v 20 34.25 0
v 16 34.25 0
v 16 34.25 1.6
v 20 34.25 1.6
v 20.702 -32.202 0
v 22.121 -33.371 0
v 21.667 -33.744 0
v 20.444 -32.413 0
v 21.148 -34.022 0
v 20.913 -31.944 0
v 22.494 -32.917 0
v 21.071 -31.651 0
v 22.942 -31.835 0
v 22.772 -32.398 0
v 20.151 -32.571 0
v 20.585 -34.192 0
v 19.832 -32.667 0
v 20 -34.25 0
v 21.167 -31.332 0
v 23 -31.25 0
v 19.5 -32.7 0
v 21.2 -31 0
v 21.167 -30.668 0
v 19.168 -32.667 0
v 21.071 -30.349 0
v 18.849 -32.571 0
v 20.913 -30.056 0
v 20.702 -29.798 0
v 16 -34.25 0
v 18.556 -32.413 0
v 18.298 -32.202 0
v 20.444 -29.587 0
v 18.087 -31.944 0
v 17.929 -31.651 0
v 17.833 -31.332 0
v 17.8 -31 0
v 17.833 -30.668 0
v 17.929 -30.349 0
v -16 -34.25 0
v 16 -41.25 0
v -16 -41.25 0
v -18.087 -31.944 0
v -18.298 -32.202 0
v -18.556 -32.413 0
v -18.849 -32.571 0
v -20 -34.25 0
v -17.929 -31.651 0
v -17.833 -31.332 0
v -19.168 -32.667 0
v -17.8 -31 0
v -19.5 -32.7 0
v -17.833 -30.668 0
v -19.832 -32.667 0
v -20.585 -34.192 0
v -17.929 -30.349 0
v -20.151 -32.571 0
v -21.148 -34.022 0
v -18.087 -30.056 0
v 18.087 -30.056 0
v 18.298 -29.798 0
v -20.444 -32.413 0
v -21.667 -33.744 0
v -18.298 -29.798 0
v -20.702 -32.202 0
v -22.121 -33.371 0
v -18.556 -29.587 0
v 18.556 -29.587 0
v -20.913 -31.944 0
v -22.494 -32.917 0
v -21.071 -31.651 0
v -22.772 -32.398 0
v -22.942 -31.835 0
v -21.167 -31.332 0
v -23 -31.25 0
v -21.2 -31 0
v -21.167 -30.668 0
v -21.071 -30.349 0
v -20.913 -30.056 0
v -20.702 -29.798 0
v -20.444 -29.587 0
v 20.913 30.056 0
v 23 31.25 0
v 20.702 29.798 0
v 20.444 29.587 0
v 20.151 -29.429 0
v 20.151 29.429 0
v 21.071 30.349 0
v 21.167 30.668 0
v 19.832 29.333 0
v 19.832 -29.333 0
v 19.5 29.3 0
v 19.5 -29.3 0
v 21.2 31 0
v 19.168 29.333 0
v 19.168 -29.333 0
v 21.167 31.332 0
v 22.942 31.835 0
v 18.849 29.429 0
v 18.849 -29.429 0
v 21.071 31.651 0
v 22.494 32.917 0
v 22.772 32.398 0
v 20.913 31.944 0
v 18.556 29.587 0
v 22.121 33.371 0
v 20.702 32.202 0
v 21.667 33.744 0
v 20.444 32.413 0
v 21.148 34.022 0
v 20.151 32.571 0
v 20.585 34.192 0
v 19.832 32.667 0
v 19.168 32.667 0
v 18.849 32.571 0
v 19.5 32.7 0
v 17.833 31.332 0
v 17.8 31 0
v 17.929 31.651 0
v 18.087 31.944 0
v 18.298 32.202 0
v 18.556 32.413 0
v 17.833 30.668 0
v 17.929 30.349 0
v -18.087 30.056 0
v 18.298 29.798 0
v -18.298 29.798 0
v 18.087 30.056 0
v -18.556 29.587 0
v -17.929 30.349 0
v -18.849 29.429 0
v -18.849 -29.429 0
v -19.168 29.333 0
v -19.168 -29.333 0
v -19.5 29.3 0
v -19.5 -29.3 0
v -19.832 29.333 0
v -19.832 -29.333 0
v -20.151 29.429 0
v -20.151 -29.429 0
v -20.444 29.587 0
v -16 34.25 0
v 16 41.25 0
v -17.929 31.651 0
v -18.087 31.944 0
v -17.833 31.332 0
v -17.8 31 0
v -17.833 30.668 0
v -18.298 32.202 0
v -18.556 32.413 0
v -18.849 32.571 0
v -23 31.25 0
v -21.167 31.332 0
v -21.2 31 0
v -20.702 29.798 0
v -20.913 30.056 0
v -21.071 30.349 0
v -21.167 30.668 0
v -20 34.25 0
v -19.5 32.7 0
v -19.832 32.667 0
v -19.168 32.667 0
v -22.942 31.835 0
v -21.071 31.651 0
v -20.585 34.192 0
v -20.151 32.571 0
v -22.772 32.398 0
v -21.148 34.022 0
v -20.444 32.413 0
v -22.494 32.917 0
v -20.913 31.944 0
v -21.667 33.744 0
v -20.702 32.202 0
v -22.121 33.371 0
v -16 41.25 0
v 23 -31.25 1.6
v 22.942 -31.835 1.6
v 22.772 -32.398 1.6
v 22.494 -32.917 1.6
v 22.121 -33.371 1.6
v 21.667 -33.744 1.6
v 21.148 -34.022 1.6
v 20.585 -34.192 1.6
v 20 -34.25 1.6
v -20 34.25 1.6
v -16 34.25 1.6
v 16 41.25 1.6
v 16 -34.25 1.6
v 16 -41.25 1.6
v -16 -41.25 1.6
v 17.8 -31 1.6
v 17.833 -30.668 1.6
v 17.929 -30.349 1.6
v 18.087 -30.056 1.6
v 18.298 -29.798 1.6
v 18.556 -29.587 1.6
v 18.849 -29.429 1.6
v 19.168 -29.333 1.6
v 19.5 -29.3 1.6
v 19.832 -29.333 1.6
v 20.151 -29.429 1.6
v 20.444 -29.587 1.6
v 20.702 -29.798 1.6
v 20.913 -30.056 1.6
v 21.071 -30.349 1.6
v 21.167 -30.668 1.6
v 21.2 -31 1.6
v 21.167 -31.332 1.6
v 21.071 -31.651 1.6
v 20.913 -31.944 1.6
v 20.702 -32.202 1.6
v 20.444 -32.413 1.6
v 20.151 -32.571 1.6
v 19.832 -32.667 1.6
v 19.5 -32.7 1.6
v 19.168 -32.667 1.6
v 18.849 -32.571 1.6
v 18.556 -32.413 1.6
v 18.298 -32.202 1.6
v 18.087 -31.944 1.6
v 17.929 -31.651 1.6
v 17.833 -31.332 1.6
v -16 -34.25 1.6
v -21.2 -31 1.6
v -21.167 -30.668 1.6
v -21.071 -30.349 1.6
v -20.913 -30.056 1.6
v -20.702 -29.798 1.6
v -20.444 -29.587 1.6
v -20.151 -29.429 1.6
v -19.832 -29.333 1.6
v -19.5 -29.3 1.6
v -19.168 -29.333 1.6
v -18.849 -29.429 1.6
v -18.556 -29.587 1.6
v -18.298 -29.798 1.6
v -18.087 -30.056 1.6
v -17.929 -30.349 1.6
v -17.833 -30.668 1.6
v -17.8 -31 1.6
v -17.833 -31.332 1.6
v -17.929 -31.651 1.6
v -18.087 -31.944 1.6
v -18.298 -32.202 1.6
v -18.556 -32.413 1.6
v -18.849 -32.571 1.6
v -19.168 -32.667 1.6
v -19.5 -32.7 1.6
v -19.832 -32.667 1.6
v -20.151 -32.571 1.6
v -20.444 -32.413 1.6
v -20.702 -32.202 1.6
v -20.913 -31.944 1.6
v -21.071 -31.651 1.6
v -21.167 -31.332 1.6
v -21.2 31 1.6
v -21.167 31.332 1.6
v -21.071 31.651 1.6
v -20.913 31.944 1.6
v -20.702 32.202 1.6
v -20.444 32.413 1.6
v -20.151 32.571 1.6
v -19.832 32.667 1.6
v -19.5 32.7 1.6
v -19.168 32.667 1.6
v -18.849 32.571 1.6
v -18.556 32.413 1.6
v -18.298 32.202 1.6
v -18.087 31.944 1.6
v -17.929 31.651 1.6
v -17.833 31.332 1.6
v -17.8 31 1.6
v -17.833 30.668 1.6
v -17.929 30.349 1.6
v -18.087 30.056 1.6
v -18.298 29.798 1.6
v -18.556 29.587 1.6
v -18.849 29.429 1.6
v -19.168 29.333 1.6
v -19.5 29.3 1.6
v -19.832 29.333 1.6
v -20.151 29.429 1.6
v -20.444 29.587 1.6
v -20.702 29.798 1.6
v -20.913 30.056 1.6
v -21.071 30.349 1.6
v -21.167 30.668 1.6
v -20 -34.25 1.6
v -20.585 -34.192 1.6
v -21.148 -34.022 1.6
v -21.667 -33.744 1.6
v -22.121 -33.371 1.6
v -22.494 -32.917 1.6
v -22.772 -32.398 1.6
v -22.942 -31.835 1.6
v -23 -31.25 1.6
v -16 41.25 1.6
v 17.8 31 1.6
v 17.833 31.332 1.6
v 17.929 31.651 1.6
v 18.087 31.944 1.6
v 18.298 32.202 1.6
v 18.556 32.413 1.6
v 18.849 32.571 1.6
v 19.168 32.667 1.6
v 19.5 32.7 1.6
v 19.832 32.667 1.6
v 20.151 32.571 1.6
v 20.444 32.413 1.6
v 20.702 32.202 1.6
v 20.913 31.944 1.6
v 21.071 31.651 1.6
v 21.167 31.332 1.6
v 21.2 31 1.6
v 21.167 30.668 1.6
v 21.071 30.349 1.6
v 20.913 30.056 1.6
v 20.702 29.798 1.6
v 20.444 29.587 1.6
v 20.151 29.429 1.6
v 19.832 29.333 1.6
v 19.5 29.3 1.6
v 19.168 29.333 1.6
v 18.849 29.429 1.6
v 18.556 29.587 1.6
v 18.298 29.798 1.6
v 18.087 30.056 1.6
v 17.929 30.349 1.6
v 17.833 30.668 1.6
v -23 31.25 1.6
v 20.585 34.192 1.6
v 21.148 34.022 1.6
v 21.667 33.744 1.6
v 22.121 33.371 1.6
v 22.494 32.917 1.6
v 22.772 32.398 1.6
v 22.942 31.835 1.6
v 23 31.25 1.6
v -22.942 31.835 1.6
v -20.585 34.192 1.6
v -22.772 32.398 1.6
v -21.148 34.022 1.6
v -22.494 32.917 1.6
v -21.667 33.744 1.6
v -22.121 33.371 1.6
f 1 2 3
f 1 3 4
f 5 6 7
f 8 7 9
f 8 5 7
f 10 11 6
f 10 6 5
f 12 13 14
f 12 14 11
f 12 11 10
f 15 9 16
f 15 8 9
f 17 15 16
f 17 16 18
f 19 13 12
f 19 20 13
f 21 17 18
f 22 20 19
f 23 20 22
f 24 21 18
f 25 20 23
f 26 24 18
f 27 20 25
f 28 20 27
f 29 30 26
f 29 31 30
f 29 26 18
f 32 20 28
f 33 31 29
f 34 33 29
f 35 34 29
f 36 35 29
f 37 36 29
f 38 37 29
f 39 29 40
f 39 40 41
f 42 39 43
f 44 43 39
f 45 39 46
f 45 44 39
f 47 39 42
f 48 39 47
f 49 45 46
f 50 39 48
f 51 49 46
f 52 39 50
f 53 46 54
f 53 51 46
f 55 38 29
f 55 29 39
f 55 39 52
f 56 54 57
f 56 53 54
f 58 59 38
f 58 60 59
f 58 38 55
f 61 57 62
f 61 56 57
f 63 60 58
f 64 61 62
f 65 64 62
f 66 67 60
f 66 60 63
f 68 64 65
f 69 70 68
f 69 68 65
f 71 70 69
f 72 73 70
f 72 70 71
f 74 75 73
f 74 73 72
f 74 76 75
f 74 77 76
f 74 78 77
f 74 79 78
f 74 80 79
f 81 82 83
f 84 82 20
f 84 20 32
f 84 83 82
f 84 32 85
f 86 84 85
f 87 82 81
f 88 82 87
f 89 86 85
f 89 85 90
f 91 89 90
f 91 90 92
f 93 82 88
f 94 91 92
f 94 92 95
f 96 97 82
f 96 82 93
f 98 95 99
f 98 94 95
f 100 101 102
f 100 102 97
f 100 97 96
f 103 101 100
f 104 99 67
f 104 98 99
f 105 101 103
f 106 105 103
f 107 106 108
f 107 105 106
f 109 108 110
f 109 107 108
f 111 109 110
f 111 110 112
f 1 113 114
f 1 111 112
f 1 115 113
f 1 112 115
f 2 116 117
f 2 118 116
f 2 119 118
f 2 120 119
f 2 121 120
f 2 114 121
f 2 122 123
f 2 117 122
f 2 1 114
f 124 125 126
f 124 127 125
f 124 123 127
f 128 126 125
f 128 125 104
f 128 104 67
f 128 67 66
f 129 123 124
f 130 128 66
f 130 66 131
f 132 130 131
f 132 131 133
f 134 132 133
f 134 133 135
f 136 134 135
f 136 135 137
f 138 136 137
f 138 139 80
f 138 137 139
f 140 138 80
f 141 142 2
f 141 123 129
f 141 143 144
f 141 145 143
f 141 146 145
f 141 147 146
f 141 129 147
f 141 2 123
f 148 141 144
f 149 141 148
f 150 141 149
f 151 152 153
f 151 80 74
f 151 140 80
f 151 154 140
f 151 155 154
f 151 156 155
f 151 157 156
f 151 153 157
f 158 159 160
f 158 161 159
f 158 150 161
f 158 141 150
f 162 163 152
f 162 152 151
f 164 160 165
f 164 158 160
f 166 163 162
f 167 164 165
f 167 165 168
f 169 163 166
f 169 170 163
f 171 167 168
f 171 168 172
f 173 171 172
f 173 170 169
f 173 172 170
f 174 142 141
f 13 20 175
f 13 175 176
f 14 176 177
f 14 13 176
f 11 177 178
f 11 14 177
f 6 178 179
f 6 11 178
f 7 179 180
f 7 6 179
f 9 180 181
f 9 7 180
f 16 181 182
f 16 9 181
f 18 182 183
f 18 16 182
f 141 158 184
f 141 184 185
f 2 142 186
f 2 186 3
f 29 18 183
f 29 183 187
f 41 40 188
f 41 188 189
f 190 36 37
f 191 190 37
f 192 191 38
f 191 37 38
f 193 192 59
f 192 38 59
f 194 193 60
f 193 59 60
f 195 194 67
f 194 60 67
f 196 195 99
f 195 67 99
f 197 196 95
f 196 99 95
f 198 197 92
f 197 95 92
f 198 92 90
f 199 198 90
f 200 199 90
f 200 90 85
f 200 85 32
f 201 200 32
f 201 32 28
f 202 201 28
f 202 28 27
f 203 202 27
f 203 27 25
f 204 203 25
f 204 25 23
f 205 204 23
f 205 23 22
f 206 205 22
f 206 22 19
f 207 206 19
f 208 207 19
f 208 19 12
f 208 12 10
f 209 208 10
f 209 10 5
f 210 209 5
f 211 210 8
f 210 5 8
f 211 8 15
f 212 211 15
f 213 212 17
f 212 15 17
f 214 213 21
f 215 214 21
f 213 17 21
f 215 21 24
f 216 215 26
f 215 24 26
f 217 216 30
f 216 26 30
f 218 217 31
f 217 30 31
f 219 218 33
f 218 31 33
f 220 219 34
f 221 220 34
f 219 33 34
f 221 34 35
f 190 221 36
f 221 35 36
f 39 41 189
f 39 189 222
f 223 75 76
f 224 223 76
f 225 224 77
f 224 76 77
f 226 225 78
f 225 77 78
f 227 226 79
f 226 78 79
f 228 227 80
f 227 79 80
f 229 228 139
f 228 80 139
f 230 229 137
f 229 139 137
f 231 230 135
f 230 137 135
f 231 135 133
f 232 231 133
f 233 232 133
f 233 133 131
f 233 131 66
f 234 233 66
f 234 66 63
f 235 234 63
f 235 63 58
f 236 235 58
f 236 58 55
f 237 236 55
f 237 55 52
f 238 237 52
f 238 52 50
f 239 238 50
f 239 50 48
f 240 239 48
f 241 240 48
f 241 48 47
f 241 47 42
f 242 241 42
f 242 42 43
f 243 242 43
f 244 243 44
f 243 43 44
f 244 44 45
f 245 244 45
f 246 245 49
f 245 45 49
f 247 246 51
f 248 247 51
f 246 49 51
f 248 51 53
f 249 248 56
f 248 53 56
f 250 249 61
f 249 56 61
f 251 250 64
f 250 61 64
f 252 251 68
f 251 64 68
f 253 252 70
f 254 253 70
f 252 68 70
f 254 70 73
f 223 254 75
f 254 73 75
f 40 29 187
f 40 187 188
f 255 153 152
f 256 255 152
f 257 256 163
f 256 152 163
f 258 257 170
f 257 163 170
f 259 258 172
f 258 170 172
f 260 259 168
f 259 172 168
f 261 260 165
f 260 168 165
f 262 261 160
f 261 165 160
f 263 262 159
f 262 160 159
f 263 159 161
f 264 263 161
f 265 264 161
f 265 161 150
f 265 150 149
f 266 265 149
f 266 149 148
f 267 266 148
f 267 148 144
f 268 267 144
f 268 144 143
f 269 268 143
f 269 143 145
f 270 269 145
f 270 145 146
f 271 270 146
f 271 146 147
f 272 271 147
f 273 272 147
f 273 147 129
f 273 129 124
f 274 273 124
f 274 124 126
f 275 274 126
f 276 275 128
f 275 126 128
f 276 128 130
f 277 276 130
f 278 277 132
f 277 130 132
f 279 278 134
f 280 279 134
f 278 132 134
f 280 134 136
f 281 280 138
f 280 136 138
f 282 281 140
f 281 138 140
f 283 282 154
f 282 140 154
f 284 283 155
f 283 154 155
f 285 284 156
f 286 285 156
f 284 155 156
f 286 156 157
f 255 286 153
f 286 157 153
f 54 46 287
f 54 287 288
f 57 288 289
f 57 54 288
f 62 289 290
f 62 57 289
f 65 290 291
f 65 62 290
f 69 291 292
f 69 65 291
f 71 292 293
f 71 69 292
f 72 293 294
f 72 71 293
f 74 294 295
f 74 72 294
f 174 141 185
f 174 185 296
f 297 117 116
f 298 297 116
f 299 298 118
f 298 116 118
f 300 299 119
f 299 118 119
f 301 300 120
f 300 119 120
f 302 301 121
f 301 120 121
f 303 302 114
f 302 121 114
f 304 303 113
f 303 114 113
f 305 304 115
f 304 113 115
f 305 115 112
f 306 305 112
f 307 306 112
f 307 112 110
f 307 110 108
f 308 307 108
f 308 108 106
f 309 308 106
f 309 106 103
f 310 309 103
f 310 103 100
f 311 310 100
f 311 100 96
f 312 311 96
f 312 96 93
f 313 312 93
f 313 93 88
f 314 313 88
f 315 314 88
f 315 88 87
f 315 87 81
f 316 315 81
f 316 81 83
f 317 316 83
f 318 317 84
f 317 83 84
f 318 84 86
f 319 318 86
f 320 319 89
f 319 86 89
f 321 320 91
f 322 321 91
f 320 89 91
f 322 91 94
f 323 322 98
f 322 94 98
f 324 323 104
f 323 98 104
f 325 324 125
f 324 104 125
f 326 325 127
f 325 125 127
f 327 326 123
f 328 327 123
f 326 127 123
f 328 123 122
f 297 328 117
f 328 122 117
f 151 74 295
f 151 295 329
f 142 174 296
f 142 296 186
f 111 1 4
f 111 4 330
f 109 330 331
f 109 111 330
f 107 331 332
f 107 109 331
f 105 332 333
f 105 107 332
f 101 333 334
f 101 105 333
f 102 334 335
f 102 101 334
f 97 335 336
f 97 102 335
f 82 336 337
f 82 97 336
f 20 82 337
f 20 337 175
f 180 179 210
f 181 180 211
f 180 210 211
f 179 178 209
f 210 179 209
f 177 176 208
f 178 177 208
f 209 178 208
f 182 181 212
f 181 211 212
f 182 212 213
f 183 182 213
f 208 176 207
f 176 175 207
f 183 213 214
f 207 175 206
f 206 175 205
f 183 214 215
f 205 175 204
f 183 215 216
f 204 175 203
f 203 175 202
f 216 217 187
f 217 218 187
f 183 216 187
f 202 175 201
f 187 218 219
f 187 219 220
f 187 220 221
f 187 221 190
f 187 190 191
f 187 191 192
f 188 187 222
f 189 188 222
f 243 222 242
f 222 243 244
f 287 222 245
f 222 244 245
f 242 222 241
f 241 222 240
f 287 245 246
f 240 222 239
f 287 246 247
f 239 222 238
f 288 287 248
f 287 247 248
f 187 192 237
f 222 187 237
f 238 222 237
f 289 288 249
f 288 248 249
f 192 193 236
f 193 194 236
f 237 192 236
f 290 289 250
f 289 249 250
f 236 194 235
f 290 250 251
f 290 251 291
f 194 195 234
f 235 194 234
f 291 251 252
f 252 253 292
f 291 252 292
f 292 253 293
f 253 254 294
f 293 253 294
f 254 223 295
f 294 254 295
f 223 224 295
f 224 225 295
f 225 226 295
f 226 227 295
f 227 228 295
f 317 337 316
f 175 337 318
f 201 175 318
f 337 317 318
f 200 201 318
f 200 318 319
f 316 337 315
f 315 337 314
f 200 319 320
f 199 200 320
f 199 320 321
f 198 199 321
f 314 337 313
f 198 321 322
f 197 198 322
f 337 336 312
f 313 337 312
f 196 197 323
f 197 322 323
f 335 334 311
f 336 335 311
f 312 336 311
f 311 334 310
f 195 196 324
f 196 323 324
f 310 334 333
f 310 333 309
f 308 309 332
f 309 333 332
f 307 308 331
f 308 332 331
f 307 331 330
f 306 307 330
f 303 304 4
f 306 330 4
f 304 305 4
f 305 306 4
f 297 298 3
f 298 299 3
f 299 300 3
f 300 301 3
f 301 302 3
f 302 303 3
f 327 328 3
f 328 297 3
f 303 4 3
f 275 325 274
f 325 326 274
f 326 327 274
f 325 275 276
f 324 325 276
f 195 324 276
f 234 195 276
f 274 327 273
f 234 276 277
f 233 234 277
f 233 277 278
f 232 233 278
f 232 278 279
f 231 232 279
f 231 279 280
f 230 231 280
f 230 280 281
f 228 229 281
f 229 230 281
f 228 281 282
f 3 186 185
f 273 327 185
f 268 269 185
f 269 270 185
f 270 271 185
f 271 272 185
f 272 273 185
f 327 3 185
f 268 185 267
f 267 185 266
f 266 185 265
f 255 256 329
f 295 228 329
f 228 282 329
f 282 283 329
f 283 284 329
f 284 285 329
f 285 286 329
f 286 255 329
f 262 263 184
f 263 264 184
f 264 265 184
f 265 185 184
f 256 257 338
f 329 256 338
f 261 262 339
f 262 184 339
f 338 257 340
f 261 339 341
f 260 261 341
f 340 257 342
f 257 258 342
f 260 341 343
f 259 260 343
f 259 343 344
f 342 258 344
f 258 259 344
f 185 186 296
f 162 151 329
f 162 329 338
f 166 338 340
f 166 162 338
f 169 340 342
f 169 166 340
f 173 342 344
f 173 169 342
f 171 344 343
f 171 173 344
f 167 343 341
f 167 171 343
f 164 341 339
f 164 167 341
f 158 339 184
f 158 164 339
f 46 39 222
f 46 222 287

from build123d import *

# Parameters (mm, degrees)
EXTRUDE_1_DEPTH       = 1.6
HOLE_WIZARD_M31_D     = 3.4
HOLE_WIZARD_M31_DEPTH = 10
HOLE_WIZARD_M31_TIP   = 1.021463052


with BuildPart() as part:
    # Эскиз1 → Бобышка-Вытянуть1 (new body)
    with BuildSketch(Plane.XY):
        with BuildLine():
            Line((-16, 34.25), (-16, 41.25))
            Line((-16, 41.25), (16, 41.25))
            Line((16, 41.25), (16, 34.25))
            Line((16, 34.25), (20, 34.25))
            ThreePointArc((20, 34.25), (22.121320344, 33.371320344), (23, 31.25))
            Line((23, 31.25), (23, -31.25))
            ThreePointArc((23, -31.25), (22.121320344, -33.371320344), (20, -34.25))
            Line((20, -34.25), (16, -34.25))
            Line((16, -34.25), (16, -41.25))
            Line((16, -41.25), (-16, -41.25))
            Line((-16, -41.25), (-16, -34.25))
            Line((-16, -34.25), (-20, -34.25))
            ThreePointArc((-20, -34.25), (-22.121320344, -33.371320344), (-23, -31.25))
            Line((-23, -31.25), (-23, 31.25))
            ThreePointArc((-23, 31.25), (-22.121320344, 33.371320344), (-20, 34.25))
            Line((-20, 34.25), (-16, 34.25))
        make_face()
    extrude(amount=EXTRUDE_1_DEPTH)

    # Отверстие с зазором M31
    with Locations(Plane.XY.offset(1.6)):
        with Locations((-19.5, 31), (19.5, 31), (19.5, -31), (-19.5, -31)):
            Hole(HOLE_WIZARD_M31_D / 2, depth=HOLE_WIZARD_M31_DEPTH)
            with Locations((0, 0, -(HOLE_WIZARD_M31_DEPTH + HOLE_WIZARD_M31_TIP / 2))):  # 118° drill point
                Cone(0, HOLE_WIZARD_M31_D / 2, HOLE_WIZARD_M31_TIP, mode=Mode.SUBTRACT)


solid = part.part
